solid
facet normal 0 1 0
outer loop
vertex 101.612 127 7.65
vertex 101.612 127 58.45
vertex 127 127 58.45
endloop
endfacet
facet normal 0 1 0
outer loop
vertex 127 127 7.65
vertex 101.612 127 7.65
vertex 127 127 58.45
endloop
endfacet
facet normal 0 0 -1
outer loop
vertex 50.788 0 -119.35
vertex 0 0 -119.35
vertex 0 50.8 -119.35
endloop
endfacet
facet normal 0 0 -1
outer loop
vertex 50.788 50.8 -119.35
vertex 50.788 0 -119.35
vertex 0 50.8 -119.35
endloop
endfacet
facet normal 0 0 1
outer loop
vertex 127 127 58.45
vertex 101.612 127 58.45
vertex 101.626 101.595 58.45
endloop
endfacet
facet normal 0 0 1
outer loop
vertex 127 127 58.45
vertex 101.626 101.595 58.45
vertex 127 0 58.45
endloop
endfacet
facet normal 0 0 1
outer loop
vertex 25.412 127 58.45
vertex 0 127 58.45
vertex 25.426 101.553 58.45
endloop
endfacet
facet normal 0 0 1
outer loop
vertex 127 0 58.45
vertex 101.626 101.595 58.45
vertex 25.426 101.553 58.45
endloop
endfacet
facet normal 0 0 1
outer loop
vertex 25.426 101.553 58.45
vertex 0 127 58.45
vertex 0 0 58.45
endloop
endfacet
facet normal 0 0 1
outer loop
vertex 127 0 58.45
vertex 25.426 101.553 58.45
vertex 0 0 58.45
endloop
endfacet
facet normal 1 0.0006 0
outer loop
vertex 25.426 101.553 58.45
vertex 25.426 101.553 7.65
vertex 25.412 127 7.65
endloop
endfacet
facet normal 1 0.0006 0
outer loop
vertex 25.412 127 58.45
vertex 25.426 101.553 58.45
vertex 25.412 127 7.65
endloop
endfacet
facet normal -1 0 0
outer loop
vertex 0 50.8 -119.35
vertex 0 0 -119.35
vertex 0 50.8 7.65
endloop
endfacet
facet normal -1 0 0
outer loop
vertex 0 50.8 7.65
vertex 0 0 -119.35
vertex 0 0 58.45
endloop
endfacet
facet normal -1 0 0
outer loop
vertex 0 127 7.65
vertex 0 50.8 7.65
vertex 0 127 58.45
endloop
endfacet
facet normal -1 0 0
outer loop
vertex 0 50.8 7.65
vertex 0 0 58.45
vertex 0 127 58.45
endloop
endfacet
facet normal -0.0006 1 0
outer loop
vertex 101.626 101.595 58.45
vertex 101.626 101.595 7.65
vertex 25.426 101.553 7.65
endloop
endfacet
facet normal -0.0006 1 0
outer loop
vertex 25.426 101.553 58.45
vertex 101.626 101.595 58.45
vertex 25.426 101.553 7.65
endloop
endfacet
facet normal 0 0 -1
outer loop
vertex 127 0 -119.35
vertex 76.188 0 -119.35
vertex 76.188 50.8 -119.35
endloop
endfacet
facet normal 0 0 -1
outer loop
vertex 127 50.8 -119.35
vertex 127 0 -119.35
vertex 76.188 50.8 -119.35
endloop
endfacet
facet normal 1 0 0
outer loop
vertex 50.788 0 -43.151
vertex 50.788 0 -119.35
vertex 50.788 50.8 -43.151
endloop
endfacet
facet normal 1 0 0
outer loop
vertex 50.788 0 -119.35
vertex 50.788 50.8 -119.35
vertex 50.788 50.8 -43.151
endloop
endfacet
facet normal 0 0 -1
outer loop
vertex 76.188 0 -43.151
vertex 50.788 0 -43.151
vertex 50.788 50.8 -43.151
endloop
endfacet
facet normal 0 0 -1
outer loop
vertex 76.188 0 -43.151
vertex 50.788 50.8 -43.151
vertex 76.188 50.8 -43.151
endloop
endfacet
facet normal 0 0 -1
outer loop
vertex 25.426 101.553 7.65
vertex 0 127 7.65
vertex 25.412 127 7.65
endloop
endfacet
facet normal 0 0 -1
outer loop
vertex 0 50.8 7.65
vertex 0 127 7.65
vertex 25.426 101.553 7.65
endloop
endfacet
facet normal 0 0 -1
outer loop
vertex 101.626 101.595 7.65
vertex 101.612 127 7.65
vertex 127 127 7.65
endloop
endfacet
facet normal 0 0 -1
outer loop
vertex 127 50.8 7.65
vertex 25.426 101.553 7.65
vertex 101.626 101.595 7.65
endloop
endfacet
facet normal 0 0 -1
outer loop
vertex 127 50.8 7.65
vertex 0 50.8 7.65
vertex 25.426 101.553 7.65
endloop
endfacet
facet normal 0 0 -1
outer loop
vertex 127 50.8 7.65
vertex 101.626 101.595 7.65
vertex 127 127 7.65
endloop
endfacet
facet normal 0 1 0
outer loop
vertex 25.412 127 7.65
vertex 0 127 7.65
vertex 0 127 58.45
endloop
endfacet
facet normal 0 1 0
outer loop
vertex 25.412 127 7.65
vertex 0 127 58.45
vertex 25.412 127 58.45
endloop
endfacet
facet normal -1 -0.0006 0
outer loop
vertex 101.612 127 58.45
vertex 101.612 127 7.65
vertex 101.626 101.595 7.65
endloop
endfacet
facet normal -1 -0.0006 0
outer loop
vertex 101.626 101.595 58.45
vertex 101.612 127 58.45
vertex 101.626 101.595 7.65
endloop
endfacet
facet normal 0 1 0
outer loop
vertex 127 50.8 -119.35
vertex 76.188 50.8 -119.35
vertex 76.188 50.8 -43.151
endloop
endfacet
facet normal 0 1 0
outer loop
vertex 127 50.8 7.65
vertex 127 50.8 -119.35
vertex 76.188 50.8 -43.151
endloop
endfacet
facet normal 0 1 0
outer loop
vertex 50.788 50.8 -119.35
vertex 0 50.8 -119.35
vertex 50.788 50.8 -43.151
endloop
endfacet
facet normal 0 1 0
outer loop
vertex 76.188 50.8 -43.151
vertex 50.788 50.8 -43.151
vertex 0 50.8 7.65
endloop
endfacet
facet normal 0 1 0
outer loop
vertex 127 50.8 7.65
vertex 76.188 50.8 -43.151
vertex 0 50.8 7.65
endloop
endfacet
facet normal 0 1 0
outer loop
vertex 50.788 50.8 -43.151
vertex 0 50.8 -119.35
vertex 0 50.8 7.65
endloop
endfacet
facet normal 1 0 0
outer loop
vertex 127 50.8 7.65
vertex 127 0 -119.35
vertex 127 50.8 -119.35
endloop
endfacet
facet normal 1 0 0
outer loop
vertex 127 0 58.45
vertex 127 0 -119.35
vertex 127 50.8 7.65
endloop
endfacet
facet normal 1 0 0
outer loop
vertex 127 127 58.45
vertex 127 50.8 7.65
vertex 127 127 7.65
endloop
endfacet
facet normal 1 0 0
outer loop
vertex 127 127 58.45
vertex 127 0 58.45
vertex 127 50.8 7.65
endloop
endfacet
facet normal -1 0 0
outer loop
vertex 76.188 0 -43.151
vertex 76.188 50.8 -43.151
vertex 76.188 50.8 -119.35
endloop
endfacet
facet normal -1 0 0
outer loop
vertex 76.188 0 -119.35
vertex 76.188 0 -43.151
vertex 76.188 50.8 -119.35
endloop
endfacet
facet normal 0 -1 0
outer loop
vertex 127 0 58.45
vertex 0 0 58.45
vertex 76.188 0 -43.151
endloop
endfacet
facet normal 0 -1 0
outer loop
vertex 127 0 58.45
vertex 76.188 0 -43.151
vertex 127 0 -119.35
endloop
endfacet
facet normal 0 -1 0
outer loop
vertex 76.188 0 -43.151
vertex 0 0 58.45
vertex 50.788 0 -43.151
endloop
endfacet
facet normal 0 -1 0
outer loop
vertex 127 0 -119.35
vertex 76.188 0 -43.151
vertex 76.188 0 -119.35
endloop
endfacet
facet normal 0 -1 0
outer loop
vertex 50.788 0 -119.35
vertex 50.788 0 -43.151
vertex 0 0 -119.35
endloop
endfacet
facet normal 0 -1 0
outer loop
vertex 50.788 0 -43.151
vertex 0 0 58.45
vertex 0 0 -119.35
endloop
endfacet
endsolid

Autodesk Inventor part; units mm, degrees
ref_plane "YZ Plane" through (0, 0, 0) normal (1, 0, 0) x (0, 1, 0)
ref_plane "XZ Plane" through (0, 0, 0) normal (0, 1, 0) x (-1, 0, 0)
ref_plane "XY Plane" through (0, 0, 0) normal (0, 0, 1) x (1, 0, 0)
sketch "Sketch1" plane through (0, 0, 0) normal (1, 0, 0) x (0, 1, 0)
  line L0 (0, 58.45) -> (0, -119.35)
  line L1 (0, -119.35) -> (50.8, -119.35)
  line L2 (50.8, -119.35) -> (50.8, 58.45)
  line L3 (50.8, 58.45) -> (0, 58.45)
  point P0 (0, 0)
  dimension "d0" = 177.8
  dimension "d1" = 50.8
  dimension "d2" = 177.8
extrude "Extrusion1" add sketch "Sketch1" along normal blind 127
sketch "Sketch2" plane through (0, 50.8, 58.45) normal (0, 1, 0) x (1, 0, 0)
  line L0 (0, 0) -> (0, 50.8)
  line L1 (0, 0) -> (0, 177.8) projected
  line L2 (0, 50.8) -> (127, 50.8)
  line L3 (127, 0) -> (127, 177.8) projected
  line L4 (127, 50.8) -> (127, 0)
  line L5 (0, 0) -> (127, 0) projected
  line L6 (127, 0) -> (0, 0)
  point P0 (0, 58.45)
  dimension "d5" = 50.8
extrude "Extrusion2" add sketch "Sketch2" along normal blind 76.2
sketch "Sketch3" plane through (0, 50.8, -119.35) normal (0, 1, 0) x (1, 0, 0)
  line L0 (0, 0) -> (127, 0) projected
  line L1 (50.7885, 0) -> (50.7885, -76.1988)
  line L2 (50.7885, -76.1988) -> (76.1885, -76.1988)
  line L3 (76.1885, -76.1988) -> (76.1885, 0)
  line L4 (50.7885, 0) -> (76.1885, 0)
  point P0 (0, -119.35)
  dimension "d8" = 25.4
extrude "Extrusion3" cut sketch "Sketch3" against normal blind 50.8
sketch "Sketch4" plane through (127, 50.8, 7.65) normal (0, 0, -1) x (-1, 0, 0)
  line L0 (0, 76.2) -> (127, 76.2) projected
  line L1 (25.3885, 76.2) -> (25.3745, 50.7949)
  line L2 (25.3745, 50.7949) -> (101.5745, 50.7531)
  line L3 (101.5745, 50.7531) -> (101.5885, 76.2)
  line L4 (25.3885, 76.2) -> (101.5885, 76.2)
  point P0 (127, -50.8)
  dimension "d11" = 76.2
extrude "Extrusion4" cut sketch "Sketch4" against normal blind 50.8
properties part number "AddSub (1)"
